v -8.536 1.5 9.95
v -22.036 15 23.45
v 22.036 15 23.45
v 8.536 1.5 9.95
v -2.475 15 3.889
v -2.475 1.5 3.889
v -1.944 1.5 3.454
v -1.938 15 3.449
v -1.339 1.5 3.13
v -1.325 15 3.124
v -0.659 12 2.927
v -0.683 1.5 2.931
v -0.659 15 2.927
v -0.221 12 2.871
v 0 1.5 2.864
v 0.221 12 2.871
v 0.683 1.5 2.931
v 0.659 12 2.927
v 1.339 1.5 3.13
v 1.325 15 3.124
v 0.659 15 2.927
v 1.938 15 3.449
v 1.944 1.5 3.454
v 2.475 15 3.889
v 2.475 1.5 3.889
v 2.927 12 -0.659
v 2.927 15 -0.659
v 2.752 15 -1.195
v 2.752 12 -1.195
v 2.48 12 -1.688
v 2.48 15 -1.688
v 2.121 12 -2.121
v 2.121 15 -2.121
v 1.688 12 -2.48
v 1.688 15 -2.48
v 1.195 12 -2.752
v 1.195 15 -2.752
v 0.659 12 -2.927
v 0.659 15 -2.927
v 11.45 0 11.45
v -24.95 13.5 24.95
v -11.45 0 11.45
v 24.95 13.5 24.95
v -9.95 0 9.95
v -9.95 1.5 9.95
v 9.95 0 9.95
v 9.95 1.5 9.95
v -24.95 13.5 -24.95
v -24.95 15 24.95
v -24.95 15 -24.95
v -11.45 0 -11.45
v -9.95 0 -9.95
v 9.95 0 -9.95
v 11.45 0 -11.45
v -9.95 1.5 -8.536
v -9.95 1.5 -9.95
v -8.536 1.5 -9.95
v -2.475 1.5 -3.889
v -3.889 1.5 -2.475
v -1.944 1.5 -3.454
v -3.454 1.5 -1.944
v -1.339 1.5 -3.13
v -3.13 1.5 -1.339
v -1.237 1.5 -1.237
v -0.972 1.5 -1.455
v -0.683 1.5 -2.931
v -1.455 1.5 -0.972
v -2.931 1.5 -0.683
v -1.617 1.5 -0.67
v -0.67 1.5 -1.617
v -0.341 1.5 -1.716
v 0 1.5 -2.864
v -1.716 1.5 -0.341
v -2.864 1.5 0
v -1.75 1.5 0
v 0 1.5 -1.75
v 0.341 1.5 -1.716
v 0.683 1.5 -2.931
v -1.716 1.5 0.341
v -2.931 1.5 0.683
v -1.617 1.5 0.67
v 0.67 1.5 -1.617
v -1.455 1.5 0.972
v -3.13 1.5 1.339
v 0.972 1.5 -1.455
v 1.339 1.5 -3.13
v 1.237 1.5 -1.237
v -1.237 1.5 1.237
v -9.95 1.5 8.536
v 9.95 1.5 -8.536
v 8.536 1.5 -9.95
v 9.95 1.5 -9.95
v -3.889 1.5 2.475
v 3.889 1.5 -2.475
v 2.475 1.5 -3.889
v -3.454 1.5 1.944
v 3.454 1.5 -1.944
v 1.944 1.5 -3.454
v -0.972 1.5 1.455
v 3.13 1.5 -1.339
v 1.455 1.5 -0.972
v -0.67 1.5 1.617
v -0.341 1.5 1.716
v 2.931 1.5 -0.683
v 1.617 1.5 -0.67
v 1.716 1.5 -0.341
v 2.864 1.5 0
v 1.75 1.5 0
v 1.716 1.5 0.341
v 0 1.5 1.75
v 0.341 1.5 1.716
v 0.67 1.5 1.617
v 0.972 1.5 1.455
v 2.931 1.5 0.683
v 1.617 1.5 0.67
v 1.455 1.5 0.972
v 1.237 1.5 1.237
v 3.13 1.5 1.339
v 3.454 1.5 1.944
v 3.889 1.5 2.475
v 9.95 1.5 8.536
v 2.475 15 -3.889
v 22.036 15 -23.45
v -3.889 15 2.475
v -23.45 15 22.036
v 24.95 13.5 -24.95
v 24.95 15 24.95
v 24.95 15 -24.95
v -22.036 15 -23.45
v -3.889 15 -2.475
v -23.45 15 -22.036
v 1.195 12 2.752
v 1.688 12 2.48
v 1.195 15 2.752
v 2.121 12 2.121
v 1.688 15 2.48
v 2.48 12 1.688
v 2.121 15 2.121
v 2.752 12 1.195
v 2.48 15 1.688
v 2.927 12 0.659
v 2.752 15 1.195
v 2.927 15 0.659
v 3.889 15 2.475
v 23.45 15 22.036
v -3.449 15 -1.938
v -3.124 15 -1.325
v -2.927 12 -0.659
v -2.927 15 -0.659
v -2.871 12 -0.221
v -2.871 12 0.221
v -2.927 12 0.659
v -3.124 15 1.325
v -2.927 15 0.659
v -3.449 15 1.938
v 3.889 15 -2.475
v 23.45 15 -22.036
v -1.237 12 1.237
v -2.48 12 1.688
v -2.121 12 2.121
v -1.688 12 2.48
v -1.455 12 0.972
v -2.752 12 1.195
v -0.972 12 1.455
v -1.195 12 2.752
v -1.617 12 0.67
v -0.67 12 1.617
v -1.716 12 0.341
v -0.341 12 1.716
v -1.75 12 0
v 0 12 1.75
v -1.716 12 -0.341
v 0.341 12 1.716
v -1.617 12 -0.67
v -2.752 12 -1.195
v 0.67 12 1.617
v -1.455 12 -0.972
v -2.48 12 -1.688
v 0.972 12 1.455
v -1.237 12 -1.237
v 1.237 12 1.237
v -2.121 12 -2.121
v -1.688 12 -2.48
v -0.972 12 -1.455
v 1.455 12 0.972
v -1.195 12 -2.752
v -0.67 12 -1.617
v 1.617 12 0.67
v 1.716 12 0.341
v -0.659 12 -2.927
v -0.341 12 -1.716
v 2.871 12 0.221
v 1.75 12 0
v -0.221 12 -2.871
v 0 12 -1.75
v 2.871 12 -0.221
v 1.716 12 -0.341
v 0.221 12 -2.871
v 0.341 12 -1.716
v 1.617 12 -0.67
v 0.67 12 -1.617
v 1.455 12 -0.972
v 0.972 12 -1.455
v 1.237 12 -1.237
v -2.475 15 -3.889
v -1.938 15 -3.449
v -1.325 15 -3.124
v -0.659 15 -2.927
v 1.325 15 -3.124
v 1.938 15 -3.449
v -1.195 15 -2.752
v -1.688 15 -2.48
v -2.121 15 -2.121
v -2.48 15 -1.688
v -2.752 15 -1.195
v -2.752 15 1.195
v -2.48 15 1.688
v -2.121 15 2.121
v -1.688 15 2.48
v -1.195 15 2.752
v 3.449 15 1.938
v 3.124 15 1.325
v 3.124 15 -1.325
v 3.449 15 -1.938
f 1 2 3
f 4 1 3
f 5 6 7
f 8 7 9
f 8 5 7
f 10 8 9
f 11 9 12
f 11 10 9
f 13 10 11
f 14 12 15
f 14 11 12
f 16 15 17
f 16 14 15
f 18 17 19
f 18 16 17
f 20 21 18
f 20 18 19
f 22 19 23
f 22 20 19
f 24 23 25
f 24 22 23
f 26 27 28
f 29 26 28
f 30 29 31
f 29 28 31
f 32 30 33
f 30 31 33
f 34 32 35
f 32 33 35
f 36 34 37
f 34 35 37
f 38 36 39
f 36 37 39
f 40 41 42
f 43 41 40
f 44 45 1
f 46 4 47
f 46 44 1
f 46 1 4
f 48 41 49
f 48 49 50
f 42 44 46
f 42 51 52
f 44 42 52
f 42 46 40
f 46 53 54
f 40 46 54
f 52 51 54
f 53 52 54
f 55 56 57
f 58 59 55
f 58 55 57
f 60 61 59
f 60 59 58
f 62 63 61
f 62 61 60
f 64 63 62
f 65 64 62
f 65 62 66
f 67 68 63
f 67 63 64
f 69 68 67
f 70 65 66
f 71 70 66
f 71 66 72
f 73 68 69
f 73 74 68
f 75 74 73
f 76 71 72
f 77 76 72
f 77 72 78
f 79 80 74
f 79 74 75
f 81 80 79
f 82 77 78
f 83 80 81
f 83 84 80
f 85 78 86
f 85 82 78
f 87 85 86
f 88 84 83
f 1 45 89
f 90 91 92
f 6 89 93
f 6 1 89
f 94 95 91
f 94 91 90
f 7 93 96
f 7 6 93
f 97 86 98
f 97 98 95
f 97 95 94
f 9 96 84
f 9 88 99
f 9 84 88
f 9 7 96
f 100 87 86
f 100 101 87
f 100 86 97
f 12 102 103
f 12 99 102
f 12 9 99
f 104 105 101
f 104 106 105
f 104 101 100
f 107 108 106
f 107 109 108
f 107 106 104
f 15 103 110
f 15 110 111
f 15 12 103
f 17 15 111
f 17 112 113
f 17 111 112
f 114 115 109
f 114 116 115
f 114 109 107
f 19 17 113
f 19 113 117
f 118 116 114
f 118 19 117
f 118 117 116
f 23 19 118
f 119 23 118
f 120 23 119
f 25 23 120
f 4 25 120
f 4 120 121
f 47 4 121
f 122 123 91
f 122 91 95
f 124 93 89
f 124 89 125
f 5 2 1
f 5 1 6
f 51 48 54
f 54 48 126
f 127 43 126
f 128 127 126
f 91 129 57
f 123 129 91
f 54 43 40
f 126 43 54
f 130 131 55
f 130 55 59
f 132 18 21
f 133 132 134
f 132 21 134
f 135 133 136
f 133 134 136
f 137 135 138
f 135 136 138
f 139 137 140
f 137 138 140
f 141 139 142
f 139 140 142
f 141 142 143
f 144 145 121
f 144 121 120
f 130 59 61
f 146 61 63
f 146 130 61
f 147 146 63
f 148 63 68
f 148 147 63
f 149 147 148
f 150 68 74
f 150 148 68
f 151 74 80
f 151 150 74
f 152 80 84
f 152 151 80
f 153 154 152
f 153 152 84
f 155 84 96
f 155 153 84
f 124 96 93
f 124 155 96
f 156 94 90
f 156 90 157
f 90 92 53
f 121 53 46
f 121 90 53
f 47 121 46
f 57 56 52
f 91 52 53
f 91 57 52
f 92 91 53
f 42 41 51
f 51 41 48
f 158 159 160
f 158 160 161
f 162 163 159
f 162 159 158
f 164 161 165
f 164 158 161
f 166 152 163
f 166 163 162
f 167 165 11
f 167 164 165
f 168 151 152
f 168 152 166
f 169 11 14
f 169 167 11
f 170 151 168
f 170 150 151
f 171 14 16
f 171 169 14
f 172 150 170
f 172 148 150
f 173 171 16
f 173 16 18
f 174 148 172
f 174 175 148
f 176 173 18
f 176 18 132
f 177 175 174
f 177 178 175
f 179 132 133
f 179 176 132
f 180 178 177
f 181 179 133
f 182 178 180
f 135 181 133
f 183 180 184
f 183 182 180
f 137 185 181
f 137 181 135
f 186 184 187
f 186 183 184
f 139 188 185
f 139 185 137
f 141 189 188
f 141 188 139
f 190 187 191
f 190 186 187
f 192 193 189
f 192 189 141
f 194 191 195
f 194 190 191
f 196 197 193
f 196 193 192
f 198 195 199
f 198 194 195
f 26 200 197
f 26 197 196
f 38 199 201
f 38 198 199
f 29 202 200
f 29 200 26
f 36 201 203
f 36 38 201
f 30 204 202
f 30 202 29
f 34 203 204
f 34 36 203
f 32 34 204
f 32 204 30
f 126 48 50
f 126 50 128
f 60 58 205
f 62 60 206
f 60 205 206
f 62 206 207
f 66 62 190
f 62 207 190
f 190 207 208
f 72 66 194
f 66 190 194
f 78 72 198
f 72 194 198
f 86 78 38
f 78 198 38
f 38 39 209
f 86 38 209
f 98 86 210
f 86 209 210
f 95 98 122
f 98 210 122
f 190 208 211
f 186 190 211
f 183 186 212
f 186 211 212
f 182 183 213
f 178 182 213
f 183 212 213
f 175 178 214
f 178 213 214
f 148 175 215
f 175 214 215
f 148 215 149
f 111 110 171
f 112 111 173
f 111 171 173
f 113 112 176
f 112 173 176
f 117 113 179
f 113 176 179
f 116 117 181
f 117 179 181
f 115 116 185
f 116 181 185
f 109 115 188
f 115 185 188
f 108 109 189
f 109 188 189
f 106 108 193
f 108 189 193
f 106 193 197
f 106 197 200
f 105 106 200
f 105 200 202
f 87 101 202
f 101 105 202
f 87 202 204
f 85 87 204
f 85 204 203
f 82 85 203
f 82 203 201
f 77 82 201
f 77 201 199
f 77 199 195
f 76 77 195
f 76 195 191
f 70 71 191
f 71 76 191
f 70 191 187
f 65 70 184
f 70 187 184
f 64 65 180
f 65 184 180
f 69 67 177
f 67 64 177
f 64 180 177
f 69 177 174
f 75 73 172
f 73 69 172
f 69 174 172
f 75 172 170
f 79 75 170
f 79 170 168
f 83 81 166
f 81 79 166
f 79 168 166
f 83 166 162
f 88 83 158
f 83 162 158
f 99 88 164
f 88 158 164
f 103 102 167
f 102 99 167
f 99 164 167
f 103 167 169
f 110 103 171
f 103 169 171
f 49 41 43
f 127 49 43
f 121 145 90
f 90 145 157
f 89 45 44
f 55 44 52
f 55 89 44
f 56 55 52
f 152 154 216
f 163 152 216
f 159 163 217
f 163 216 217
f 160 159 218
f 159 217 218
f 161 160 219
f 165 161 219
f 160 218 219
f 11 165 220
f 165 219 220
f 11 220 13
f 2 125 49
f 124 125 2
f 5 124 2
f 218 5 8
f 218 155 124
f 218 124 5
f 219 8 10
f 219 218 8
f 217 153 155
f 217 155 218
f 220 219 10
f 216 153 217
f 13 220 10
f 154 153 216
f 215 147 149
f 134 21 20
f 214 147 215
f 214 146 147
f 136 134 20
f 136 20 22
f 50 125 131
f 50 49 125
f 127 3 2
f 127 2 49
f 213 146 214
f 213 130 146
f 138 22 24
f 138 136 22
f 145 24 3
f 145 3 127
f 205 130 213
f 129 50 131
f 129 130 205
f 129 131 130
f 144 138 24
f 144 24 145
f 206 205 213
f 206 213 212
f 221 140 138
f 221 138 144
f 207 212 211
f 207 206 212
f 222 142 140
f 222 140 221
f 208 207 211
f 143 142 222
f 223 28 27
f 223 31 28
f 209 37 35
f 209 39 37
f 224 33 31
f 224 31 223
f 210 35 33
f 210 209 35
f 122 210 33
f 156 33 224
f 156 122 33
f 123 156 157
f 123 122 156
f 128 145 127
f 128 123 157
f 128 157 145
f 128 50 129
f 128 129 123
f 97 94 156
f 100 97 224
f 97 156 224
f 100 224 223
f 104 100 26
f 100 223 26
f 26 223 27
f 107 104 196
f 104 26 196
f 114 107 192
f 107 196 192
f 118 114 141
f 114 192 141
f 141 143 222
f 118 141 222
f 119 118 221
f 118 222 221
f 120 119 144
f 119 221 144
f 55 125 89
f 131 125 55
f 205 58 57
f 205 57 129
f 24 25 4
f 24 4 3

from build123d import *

# Parameters (mm, degrees)
SKETCH1_W           = 49.9
SKETCH1_H           = 49.9
BOSS_EXTRUDE1_DEPTH = 15
CHAMFER1_SIZE       = 13.5
CHAMFER2_SIZE       = 13.5
FILLET1_R           = 3.5
SKETCH2_R           = 3
SKETCH2_R_2         = 1.75
CUT_EXTRUDE1_DEPTH  = 3
SKETCH2_2_R         = 1.75
CUT_EXTRUDE2_DEPTH  = 39.34064423
CUT_EXTRUDE3_START  = -1.5
SKETCH3_R           = 1.75
CUT_EXTRUDE3_DEPTH  = 1.5


with BuildPart() as part:
    # Sketch1 → Boss-Extrude1 (new body)
    with BuildSketch(Plane(origin=(0, 0, 0), x_dir=(1, 0, 0), z_dir=(0, 1, 0))):
        Rectangle(SKETCH1_W, SKETCH1_H)
        Polygon((8.535786438, -9.95), (-8.535786438, -9.95), (0, -1.414213562), align=None, mode=Mode.SUBTRACT)
        Polygon((9.95, 8.535786438), (9.95, -8.535786438), (1.414213562, 0), align=None, mode=Mode.SUBTRACT)
        Polygon((-8.535786438, 9.95), (8.535786438, 9.95), (0, 1.414213562), align=None, mode=Mode.SUBTRACT)
        Polygon((-9.95, -8.535786438), (-9.95, 8.535786438), (-1.414213562, 0), align=None, mode=Mode.SUBTRACT)
    extrude(amount=BOSS_EXTRUDE1_DEPTH)

    # Chamfer1
    chamfer1_edges = [part.edges().sort_by_distance(p)[0] for p in [
        (-24.95, 0, 0),
        (0, 0, 24.95),
        (24.95, 0, 0),
        (0, 0, -24.95),
    ]]
    chamfer(chamfer1_edges, length=CHAMFER1_SIZE)

    # Chamfer2
    chamfer2_edges = [part.edges().sort_by_distance(p)[0] for p in [
        (0, 15, -9.95),
        (-9.95, 15, 0),
        (0, 15, 9.95),
        (9.95, 15, 0),
    ]]
    chamfer(chamfer2_edges, length=CHAMFER2_SIZE)

    # Fillet1
    fillet1_edges = [part.edges().sort_by_distance(p)[0] for p in [
        (0, 7.5, 1.414213562),
        (1.414213562, 7.5, 0),
        (0, 7.5, -1.414213562),
        (-1.414213562, 7.5, 0),
    ]]
    fillet(fillet1_edges, radius=FILLET1_R)

    # Sketch2 → Cut-Extrude1 (cut)
    with BuildSketch(Plane(origin=(0, 15, 0), x_dir=(1, 0, 0), z_dir=(0, 1, 0))):
        Circle(SKETCH2_R)
        Circle(SKETCH2_R_2, mode=Mode.SUBTRACT)
    extrude(amount=-CUT_EXTRUDE1_DEPTH, mode=Mode.SUBTRACT)

    # Sketch2<2> → Cut-Extrude2 (cut, through all)
    with BuildSketch(Plane(origin=(0, 15, 0), x_dir=(1, 0, 0), z_dir=(0, 1, 0))):
        Circle(SKETCH2_2_R)
    extrude(amount=-CUT_EXTRUDE2_DEPTH, mode=Mode.SUBTRACT)

    # Sketch3 → Cut-Extrude3 (cut)
    with BuildSketch(Plane.XZ.offset(CUT_EXTRUDE3_START)):
        with BuildLine():
            Line((-8.535786438, 9.95), (-9.95, 9.95))
            Line((-9.95, 9.95), (-9.95, 8.535786438))
            Line((-9.95, 8.535786438), (-3.889087297, 2.474873734))
            ThreePointArc((-3.889087297, 2.474873734), (-2.863961031, 0), (-3.889087297, -2.474873734))
            Line((-3.889087297, -2.474873734), (-9.95, -8.535786438))
            Line((-9.95, -8.535786438), (-9.95, -9.95))
            Line((-9.95, -9.95), (-8.535786438, -9.95))
            Line((-8.535786438, -9.95), (-2.474873734, -3.889087297))
            ThreePointArc((-2.474873734, -3.889087297), (0, -2.863961031), (2.474873734, -3.889087297))
            Line((2.474873734, -3.889087297), (8.535786438, -9.95))
            Line((8.535786438, -9.95), (9.95, -9.95))
            Line((9.95, -9.95), (9.95, -8.535786438))
            Line((9.95, -8.535786438), (3.889087297, -2.474873734))
            ThreePointArc((3.889087297, -2.474873734), (2.863961031, 0), (3.889087297, 2.474873734))
            Line((3.889087297, 2.474873734), (9.95, 8.535786438))
            Line((9.95, 8.535786438), (9.95, 9.95))
            Line((9.95, 9.95), (8.535786438, 9.95))
            Line((8.535786438, 9.95), (2.474873734, 3.889087297))
            ThreePointArc((2.474873734, 3.889087297), (0, 2.863961031), (-2.474873734, 3.889087297))
            Line((-2.474873734, 3.889087297), (-8.535786438, 9.95))
        make_face()
        Circle(SKETCH3_R, mode=Mode.SUBTRACT)
    extrude(amount=CUT_EXTRUDE3_DEPTH, mode=Mode.SUBTRACT)


solid = part.part
